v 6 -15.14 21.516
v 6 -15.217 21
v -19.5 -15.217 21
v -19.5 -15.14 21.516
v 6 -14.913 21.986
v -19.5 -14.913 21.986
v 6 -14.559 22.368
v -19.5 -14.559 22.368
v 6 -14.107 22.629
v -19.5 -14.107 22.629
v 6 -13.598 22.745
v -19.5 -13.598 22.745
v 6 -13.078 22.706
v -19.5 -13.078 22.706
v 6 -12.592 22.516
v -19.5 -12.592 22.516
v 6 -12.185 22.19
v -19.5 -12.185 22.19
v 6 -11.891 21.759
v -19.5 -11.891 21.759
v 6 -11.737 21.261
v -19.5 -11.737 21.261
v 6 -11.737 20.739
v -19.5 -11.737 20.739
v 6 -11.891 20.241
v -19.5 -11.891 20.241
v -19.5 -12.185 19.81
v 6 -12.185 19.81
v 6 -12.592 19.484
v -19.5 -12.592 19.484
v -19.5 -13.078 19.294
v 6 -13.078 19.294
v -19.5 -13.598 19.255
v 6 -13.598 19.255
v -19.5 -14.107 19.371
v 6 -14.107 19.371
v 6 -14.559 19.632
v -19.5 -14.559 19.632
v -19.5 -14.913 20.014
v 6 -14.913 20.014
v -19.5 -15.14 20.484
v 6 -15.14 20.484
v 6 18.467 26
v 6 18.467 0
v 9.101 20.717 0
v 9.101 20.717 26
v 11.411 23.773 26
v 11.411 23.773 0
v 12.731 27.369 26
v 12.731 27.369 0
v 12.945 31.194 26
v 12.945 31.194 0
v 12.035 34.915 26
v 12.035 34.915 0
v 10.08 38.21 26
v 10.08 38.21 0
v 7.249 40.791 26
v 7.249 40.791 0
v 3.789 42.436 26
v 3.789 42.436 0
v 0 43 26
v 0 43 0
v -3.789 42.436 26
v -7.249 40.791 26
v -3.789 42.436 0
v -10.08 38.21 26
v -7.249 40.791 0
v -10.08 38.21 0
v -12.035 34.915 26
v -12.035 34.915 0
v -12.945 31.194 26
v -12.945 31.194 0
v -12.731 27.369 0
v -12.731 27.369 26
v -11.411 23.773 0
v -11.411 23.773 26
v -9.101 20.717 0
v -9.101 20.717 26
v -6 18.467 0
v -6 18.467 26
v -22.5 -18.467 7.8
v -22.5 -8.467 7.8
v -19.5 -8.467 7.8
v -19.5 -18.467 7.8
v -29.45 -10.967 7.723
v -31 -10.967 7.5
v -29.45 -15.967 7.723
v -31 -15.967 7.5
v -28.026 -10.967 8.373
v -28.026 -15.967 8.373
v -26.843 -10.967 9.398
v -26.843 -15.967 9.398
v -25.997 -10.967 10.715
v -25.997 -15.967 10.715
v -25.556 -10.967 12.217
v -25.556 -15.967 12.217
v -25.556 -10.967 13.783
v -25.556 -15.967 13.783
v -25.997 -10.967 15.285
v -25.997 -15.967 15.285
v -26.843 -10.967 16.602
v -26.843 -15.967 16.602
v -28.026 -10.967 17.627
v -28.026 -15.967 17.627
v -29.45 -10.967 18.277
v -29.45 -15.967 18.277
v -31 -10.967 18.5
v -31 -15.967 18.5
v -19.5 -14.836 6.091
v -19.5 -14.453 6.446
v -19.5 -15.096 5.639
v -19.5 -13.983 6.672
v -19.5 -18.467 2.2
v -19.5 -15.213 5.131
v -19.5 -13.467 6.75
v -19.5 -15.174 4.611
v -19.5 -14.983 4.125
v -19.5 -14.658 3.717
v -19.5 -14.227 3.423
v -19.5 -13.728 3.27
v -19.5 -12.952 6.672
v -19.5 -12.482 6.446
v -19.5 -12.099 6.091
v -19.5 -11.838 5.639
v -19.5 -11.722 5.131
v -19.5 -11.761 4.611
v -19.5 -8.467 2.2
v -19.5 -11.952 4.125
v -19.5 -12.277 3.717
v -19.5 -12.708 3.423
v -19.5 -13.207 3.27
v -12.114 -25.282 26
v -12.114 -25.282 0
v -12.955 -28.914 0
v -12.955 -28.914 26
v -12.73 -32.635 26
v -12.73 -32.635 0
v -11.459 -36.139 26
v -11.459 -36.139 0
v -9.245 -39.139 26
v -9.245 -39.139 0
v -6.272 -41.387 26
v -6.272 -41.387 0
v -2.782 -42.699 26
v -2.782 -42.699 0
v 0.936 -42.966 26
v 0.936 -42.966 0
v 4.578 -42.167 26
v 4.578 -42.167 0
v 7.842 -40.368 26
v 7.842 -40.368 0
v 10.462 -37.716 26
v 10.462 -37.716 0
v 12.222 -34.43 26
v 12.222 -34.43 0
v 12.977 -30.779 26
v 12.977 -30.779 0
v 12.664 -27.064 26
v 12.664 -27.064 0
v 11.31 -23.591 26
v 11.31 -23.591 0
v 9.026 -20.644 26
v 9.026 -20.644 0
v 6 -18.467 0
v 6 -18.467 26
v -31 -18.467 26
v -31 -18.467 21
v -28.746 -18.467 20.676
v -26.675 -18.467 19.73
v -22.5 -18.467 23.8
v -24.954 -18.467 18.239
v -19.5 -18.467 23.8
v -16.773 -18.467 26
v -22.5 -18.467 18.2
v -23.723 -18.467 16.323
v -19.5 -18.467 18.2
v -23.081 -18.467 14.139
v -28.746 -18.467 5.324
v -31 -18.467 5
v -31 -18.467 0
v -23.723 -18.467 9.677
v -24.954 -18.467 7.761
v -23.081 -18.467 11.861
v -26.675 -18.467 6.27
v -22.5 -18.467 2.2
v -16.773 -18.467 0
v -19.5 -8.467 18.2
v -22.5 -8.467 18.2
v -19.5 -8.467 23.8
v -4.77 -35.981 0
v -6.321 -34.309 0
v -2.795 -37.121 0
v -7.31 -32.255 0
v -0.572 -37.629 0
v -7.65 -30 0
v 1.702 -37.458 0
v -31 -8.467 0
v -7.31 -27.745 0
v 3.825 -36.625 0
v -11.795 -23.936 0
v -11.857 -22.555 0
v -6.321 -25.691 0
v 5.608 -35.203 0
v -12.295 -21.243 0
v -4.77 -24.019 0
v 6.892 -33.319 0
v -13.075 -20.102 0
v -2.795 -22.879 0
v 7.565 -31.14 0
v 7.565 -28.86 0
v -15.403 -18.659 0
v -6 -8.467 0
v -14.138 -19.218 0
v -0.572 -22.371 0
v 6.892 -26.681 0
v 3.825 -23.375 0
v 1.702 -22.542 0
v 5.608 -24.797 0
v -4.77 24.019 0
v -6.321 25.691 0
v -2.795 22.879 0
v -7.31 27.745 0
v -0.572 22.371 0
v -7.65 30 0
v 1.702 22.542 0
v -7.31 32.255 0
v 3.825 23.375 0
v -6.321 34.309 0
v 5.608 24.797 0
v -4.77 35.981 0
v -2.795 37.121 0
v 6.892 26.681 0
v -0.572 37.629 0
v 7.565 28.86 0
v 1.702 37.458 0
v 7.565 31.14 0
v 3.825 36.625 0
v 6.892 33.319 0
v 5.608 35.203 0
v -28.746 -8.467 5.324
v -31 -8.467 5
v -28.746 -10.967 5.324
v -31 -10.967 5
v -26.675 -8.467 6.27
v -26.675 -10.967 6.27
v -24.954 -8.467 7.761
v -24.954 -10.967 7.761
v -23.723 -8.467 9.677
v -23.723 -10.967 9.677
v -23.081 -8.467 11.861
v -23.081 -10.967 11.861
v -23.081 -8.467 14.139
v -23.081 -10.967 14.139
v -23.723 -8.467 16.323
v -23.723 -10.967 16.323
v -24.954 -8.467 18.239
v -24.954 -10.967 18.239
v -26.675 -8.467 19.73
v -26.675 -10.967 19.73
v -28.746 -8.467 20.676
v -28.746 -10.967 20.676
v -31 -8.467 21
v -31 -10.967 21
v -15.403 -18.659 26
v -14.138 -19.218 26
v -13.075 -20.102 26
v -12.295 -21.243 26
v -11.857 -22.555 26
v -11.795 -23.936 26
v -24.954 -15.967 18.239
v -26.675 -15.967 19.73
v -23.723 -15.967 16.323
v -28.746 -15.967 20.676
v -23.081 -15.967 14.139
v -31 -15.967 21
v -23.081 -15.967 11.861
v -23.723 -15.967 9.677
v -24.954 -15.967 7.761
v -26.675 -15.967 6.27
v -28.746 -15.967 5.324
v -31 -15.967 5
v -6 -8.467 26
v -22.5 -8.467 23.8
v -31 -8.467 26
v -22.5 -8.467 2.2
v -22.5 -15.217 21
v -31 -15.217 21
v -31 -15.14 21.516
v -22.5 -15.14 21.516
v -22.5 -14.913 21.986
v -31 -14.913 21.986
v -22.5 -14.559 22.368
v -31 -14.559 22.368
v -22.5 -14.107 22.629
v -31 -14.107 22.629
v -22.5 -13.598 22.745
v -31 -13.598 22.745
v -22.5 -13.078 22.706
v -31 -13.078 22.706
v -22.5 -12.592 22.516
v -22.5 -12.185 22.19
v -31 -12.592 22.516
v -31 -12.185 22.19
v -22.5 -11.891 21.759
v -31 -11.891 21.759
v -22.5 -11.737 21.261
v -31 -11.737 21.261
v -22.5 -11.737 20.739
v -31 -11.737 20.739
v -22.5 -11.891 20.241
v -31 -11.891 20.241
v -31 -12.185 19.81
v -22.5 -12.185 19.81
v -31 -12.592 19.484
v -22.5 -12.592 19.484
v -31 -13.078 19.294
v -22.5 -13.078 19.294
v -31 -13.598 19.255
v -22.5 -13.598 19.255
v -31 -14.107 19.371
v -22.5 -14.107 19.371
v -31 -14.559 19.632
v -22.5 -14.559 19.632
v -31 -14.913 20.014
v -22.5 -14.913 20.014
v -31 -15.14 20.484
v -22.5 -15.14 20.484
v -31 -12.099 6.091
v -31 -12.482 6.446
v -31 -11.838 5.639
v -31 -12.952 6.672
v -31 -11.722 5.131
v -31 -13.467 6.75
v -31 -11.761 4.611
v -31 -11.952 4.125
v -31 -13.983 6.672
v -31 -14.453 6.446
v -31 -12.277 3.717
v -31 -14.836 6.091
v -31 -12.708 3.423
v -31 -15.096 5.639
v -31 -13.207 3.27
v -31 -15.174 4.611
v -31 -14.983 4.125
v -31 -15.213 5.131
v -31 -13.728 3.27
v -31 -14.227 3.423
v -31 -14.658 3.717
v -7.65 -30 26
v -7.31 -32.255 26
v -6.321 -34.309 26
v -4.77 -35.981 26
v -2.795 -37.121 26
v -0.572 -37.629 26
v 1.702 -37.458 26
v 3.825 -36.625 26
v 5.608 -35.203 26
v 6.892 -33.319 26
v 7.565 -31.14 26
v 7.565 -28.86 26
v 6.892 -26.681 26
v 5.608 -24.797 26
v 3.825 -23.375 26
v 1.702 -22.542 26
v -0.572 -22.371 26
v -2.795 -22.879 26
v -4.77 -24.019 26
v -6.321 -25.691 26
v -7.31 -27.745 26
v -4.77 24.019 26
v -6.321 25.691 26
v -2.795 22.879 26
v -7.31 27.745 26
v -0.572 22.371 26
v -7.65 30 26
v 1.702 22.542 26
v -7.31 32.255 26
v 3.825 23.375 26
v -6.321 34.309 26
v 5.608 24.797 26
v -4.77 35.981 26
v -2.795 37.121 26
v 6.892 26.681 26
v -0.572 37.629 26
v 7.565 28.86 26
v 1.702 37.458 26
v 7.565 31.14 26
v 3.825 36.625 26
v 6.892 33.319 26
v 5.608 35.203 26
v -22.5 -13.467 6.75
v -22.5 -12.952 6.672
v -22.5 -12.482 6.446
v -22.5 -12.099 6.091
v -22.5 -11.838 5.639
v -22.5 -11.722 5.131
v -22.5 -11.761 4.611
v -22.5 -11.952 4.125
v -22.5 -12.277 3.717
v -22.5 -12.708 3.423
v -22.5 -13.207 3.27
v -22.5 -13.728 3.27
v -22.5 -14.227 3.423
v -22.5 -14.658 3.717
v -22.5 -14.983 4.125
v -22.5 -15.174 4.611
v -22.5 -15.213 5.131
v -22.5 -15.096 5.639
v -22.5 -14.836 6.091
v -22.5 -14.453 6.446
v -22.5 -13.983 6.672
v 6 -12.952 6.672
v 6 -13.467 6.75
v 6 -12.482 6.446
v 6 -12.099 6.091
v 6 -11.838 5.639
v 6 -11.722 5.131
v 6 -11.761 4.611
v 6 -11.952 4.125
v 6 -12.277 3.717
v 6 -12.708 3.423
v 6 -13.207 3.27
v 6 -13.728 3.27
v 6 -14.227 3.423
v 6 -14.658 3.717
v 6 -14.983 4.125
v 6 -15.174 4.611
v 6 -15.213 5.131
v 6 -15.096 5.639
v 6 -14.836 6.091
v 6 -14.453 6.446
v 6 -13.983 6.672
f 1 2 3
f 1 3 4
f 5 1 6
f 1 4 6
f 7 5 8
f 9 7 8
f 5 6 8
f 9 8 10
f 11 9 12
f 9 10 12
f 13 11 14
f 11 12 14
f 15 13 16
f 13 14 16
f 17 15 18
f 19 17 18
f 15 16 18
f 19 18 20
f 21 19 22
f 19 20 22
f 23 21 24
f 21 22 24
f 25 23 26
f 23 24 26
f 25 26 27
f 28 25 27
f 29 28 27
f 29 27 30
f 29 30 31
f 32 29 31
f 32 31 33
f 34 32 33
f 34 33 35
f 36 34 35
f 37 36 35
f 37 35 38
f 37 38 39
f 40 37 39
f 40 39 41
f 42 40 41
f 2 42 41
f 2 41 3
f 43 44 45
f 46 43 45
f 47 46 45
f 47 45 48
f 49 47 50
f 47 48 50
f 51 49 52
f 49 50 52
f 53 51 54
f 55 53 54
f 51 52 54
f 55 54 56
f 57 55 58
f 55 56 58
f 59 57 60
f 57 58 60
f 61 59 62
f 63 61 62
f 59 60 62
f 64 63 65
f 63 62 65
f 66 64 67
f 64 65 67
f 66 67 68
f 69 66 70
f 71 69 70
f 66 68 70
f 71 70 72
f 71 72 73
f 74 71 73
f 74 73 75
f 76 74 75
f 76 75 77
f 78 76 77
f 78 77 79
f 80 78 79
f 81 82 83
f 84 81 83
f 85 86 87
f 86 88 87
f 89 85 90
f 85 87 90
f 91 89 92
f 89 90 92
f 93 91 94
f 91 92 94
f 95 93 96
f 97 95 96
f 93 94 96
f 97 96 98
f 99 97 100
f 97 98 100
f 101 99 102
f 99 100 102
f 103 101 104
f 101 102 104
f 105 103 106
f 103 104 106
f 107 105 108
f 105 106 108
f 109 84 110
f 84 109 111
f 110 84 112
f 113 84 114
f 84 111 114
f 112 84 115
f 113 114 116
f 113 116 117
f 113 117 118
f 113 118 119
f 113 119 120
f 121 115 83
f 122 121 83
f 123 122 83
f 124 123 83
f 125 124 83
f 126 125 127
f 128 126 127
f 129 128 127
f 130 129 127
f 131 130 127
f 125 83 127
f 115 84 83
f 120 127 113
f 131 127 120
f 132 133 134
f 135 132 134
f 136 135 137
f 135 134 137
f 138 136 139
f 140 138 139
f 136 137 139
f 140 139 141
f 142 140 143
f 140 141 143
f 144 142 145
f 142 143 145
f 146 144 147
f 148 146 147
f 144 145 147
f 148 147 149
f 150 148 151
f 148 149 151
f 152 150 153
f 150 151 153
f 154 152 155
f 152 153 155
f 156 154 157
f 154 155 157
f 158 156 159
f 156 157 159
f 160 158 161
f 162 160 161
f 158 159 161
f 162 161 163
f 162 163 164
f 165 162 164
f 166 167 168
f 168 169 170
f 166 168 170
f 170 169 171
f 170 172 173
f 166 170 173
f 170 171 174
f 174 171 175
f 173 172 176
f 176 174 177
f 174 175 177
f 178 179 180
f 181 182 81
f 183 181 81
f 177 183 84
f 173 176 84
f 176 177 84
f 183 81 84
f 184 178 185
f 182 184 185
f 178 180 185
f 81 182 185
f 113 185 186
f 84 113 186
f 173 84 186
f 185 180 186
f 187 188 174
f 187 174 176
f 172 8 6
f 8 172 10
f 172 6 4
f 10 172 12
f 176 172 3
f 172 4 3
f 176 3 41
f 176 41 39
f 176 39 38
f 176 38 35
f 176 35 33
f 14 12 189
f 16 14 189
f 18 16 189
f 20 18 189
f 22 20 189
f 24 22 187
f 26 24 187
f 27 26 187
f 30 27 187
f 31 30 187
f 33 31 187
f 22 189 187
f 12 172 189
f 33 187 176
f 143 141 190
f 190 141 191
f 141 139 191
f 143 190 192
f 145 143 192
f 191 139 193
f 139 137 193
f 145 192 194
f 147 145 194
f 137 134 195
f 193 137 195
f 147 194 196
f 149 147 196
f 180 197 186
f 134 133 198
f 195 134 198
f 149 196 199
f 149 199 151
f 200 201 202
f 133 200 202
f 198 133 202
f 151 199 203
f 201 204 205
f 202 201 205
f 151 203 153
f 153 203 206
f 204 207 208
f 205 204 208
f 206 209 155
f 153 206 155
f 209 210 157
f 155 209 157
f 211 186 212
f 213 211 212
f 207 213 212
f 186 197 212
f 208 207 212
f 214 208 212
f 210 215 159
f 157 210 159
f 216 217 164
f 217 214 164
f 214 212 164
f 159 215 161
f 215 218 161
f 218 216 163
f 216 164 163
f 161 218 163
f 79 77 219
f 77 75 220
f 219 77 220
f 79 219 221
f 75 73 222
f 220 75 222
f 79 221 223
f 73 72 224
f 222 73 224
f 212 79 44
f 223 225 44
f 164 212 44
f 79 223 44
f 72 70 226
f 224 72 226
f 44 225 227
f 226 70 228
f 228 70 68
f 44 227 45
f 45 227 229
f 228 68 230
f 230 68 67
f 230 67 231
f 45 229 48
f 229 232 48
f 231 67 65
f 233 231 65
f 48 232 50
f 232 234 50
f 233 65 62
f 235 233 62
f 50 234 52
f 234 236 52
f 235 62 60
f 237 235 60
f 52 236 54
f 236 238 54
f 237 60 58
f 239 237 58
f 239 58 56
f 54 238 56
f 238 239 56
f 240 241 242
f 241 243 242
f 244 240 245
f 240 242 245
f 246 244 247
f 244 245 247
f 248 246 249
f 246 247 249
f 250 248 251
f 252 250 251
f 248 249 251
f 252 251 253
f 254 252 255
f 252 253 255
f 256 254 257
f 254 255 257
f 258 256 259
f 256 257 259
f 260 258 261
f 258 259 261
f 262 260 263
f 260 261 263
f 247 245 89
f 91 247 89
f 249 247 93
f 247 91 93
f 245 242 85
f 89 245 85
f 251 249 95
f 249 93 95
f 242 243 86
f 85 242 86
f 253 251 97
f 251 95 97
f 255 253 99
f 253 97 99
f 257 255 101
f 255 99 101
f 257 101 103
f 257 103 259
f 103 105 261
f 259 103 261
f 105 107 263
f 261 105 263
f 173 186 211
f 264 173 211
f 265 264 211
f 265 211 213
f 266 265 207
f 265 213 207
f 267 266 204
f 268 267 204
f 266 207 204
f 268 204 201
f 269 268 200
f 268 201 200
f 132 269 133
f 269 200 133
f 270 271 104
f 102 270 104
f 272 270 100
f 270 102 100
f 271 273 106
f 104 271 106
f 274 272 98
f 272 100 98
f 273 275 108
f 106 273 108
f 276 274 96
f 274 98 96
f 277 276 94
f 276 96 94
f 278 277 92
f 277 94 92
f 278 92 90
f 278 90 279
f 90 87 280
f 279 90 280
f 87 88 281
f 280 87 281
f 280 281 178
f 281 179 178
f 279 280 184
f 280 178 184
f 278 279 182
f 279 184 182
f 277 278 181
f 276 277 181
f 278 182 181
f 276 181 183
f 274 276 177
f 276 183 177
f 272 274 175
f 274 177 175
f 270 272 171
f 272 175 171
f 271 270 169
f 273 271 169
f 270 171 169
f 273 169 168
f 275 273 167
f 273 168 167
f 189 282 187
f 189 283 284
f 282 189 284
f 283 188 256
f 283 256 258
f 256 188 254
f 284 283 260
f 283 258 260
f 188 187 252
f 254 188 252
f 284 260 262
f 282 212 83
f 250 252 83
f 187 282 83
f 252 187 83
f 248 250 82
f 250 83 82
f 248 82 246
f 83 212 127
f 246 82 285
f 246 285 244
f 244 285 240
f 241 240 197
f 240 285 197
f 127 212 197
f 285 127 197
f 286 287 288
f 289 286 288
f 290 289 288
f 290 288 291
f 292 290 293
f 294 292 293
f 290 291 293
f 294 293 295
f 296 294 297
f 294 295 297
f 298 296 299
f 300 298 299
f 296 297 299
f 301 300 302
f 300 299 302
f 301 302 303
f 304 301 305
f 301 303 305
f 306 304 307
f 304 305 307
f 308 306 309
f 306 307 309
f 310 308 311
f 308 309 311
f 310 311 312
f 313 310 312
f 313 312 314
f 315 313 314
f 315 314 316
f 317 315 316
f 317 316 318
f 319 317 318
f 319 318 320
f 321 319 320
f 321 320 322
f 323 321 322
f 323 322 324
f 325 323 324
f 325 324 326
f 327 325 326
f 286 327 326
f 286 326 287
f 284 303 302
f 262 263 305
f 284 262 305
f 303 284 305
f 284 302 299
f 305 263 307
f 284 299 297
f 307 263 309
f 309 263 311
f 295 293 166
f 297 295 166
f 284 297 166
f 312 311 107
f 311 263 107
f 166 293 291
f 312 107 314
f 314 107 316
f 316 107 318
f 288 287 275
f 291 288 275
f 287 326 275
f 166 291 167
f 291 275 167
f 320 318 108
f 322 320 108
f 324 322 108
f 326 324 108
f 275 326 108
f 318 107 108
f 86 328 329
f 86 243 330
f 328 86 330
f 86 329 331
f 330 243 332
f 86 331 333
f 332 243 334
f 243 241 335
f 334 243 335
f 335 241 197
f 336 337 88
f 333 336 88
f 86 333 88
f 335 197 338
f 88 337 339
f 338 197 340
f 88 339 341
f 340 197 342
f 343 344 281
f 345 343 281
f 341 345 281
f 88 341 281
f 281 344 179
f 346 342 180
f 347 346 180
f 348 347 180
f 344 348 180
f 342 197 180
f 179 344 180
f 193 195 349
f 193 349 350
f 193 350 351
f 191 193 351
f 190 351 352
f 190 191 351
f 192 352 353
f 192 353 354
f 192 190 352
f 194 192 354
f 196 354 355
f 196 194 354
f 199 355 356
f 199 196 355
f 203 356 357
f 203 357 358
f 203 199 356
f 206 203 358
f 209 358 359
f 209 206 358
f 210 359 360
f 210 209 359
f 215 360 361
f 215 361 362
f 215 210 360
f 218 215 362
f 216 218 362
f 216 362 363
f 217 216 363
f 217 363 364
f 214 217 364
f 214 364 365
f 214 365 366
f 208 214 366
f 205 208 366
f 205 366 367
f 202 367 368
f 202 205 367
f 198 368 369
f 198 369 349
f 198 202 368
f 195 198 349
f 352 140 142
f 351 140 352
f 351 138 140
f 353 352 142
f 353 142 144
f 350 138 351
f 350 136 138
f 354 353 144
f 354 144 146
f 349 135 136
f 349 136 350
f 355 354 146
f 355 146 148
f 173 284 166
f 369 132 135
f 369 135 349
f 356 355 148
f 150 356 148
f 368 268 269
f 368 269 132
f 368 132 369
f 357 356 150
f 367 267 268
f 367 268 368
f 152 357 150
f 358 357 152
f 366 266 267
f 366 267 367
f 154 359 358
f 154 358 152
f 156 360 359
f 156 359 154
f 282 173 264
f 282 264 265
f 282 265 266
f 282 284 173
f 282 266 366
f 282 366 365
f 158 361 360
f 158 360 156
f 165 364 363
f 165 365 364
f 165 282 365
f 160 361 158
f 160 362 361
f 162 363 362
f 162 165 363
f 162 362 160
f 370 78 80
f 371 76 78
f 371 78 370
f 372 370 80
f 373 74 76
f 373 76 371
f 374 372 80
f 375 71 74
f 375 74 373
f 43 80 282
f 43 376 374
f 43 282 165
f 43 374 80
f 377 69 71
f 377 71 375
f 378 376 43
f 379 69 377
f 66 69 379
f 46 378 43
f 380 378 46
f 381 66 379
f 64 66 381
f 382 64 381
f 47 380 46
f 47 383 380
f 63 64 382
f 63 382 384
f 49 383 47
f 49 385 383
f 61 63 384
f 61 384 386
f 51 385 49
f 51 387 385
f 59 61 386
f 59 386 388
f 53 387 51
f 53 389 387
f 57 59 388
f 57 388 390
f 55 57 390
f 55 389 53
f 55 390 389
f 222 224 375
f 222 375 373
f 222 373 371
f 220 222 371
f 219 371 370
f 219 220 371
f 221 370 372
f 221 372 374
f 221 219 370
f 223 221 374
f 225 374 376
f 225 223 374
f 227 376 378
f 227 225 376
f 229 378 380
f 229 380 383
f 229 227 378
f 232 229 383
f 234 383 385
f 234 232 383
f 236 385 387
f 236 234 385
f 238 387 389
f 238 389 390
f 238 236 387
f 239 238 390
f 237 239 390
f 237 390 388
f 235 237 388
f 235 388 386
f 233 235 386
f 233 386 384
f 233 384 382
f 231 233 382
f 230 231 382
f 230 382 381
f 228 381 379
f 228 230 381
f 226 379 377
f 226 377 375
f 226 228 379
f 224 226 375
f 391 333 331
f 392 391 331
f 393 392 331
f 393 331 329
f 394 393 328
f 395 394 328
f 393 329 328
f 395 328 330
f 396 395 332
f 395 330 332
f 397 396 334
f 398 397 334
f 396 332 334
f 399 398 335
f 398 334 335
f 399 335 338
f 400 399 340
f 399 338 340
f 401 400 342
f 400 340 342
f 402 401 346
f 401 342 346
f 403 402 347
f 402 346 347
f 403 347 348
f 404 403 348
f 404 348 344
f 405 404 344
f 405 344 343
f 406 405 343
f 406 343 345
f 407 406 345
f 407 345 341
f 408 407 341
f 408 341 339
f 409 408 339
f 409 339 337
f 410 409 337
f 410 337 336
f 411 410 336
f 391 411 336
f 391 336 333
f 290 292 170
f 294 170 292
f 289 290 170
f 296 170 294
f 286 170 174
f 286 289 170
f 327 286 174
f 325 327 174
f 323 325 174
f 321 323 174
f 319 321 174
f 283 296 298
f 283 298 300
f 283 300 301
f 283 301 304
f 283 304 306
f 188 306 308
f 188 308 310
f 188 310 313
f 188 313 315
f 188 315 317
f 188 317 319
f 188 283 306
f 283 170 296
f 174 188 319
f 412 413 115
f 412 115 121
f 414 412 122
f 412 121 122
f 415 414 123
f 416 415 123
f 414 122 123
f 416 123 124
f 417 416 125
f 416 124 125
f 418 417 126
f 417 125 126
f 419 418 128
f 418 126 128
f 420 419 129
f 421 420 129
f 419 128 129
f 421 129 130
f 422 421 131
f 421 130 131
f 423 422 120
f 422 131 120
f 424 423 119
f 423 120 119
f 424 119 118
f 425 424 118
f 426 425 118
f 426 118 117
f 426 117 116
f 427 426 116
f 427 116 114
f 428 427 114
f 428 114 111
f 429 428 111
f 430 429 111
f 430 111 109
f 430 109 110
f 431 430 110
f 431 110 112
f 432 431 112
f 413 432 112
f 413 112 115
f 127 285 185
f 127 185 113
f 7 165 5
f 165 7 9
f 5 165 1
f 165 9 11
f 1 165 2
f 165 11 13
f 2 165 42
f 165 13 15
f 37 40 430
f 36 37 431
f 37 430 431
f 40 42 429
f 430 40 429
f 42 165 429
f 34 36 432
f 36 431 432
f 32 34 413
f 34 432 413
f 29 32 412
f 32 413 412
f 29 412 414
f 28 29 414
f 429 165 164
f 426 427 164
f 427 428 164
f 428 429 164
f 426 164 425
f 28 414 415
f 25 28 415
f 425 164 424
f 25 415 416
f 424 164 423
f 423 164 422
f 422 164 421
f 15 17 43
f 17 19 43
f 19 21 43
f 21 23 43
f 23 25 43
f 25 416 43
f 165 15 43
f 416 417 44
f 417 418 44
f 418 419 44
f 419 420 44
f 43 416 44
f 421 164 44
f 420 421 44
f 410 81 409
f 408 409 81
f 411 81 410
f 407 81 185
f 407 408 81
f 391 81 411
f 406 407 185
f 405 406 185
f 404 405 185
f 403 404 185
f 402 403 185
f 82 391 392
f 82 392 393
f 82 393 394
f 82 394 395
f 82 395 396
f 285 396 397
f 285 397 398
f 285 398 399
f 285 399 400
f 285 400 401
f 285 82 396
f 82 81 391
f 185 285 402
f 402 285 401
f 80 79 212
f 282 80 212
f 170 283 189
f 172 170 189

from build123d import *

# Parameters (mm, degrees)
ESBO_O1_R                = 7.65
RESSALTO_EXTRUS_O1_DEPTH = 26
ESBO_O4_R                = 1.75
CORTE_EXTRUS_O1_DEPTH    = 67.790717918
ESBO_O5_W                = 3
ESBO_O5_H                = 5.6
CORTE_EXTRUS_O2_DEPTH    = 25


with BuildPart() as part:
    # Esboço1 → Ressalto-extrusão1 (new body)
    with BuildSketch(Plane.XY):
        with BuildLine():
            Line((-6, 18.467437405), (-6, -8.467437405))
            Line((-6, -8.467437405), (-31, -8.467437405))
            Line((-31, -8.467437405), (-31, -18.467437405))
            Line((-31, -18.467437405), (-16.77276441, -18.467437405))
            ThreePointArc((-16.77276441, -18.467437405), (-12.645234664, -20.645470326), (-12.113663185, -25.282038126))
            ThreePointArc((-12.113663185, -25.282038126), (4.577544662, -42.16741899), (6, -18.467437405))
            Line((6, -18.467437405), (6, 18.467437405))
            ThreePointArc((6, 18.467437405), (0, 43), (-6, 18.467437405))
        make_face()
        with Locations(Location((0, 30, 0), (0, 0, 180))):
            Circle(ESBO_O1_R, mode=Mode.SUBTRACT)
        with Locations(Location((0, -30, 0), (0, 0, 180))):
            Circle(ESBO_O1_R, mode=Mode.SUBTRACT)
    extrude(amount=RESSALTO_EXTRUS_O1_DEPTH)

    # Esboço3 → Corte-Revolução1 (revolve, cut)
    with BuildSketch(Plane.ZY.offset(31)):
        Polygon((13, -8.467437405), (21, -8.467437405), (21, -10.967437405), (18.5, -10.967437405), (18.5, -15.967437405), (21, -15.967437405), (21, -18.467437405), (13, -18.467437405), align=None)
    revolve(axis=Axis((-31, -8.467437405, 13), (0, -1, 0)), mode=Mode.SUBTRACT)

    # Esboço4 → Corte-extrusão1 (cut, through all)
    with BuildSketch(Plane.ZY.offset(31)):
        with Locations((5, -13.467437405)):
            Circle(ESBO_O4_R)
        with Locations(Location((21, -13.467437405, 0), (0, 0, 270))):
            Circle(ESBO_O4_R)
    extrude(amount=-CORTE_EXTRUS_O1_DEPTH, mode=Mode.SUBTRACT)

    # Esboço5 → Corte-extrusão2 (cut)
    with BuildSketch(Plane(origin=(0, -8.467437405, 0), x_dir=(1, 0, 0), z_dir=(0, 1, 0))):
        with Locations((-21, -5)):
            Rectangle(ESBO_O5_W, ESBO_O5_H)
        with Locations((-21, -21)):
            Rectangle(ESBO_O5_W, ESBO_O5_H)
    extrude(amount=-CORTE_EXTRUS_O2_DEPTH, mode=Mode.SUBTRACT)


solid = part.part
